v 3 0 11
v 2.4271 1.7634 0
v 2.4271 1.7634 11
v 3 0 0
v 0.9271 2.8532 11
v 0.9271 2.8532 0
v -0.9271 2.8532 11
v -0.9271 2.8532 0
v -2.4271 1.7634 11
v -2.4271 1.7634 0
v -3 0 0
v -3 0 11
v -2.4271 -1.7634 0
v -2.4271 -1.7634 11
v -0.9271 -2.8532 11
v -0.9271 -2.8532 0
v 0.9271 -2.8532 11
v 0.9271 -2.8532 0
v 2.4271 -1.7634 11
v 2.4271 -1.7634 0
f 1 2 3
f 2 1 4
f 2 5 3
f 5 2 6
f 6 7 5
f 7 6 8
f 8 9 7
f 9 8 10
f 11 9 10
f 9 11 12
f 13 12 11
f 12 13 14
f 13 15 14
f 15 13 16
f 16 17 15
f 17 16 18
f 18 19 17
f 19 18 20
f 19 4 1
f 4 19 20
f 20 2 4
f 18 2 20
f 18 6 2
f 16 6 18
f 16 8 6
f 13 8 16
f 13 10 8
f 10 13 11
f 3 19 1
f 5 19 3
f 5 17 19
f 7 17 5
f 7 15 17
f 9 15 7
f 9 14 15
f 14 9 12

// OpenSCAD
// Generated by SolidPython 1.0.1 on 2020-07-29 00:46:44


cylinder(h = 11, r1 = 3, r2 = 3);
/***********************************************
*********      SolidPython code:      **********
************************************************
 
# import packages: SolidPython
from solid import *
from solid.utils import *
from itertools import chain, combinations, permutations


class Resize:

    def __init__(self, scad_file):
        self.scad_file = scad_file
        #self.scad_file = import_scad(scad_file)
        # cone/cylinder param:
        self.r1 = 0
        self.r2 = 0
        self.h = 0
        # rectangular prism param:
        self.w = 0
        self.l = 0
        # ellipse param:
        self.r = 0

    # import OpenScad code (file name corresponds to shape)


    # classify shape + parameters
    def assign(self, param1, param2, param3):
        if self.scad_file == 'cone.scad':
            self.r1 = param1
            self.r2 = param2
            self.h = param3
        elif self.scad_file == 'cylinder.scad':
            self.r1 = param1
            self.r2 = param2
            self.h = param3
        elif self.scad_file == 'rectangularPrism.scad':
            self.h = param1
            self.l = param2
            self.w = param3
        else:
            self.r = param1
            self.h = param2

    # resize parameters
    def iterate(self):
        x = range(3, 20, 2)
        i = 1
        if self.scad_file == 'cone.scad':
            tempList = list(permutations(x, 2))
            for temp in tempList:
                param1 = temp[0]
                param2 = temp[1]
                filepath = 'produced_scad_files/' + 'cone' + str(param1) + '_' + str(param2) + '_' + '.scad'
                scad_render_to_file(cylinder(h=param1, r1=param2, r2=0), filepath)

        elif self.scad_file == 'cylinder.scad':
            tempList = list(permutations(x, 3))
            for temp in tempList:
                param1 = temp[0]
                param2 = temp[1]
                filepath = 'produced_scad_files/' + 'cylinder' + str(param1) + '_' + str(param2) + '_' + '.scad'
                scad_render_to_file(cylinder(h=param1, r1=param2, r2=param2), filepath)

        elif self.scad_file == 'rectangularPrism.scad':
            tempList = list(permutations(x, 3))
            for temp in tempList:
                param1 = temp[0]
                param2 = temp[1]
                param3 = temp[2]
                filepath = 'produced_scad_files/' + 'rectangularPrism' + str(param1) + '_' + str(param2) + '_' + str(
                    param3) + '.scad'
                scad_render_to_file(cube(size=(param1, param2, param3)), filepath)

        elif self.scad_file == 'ellipse.scad':
            tempList = list(permutations(x, 4))
            for temp in tempList:
                param1 = temp[0]
                param2 = temp[1]
                param3 = temp[2]
                param4 = temp[3]
                filepath = 'produced_scad_files/' + 'ellipse' + str(param1) + '_' + str(param2) + '_' + str(param3) + '_' + str(param4) + '.scad'
                scad_render_to_file(scale([param1, param2, param3])(sphere(r=param4)), filepath)

    def render_to_scadfile(self):
        scad_render_to_file(scad, 'example.scad') 
 
************************************************/
